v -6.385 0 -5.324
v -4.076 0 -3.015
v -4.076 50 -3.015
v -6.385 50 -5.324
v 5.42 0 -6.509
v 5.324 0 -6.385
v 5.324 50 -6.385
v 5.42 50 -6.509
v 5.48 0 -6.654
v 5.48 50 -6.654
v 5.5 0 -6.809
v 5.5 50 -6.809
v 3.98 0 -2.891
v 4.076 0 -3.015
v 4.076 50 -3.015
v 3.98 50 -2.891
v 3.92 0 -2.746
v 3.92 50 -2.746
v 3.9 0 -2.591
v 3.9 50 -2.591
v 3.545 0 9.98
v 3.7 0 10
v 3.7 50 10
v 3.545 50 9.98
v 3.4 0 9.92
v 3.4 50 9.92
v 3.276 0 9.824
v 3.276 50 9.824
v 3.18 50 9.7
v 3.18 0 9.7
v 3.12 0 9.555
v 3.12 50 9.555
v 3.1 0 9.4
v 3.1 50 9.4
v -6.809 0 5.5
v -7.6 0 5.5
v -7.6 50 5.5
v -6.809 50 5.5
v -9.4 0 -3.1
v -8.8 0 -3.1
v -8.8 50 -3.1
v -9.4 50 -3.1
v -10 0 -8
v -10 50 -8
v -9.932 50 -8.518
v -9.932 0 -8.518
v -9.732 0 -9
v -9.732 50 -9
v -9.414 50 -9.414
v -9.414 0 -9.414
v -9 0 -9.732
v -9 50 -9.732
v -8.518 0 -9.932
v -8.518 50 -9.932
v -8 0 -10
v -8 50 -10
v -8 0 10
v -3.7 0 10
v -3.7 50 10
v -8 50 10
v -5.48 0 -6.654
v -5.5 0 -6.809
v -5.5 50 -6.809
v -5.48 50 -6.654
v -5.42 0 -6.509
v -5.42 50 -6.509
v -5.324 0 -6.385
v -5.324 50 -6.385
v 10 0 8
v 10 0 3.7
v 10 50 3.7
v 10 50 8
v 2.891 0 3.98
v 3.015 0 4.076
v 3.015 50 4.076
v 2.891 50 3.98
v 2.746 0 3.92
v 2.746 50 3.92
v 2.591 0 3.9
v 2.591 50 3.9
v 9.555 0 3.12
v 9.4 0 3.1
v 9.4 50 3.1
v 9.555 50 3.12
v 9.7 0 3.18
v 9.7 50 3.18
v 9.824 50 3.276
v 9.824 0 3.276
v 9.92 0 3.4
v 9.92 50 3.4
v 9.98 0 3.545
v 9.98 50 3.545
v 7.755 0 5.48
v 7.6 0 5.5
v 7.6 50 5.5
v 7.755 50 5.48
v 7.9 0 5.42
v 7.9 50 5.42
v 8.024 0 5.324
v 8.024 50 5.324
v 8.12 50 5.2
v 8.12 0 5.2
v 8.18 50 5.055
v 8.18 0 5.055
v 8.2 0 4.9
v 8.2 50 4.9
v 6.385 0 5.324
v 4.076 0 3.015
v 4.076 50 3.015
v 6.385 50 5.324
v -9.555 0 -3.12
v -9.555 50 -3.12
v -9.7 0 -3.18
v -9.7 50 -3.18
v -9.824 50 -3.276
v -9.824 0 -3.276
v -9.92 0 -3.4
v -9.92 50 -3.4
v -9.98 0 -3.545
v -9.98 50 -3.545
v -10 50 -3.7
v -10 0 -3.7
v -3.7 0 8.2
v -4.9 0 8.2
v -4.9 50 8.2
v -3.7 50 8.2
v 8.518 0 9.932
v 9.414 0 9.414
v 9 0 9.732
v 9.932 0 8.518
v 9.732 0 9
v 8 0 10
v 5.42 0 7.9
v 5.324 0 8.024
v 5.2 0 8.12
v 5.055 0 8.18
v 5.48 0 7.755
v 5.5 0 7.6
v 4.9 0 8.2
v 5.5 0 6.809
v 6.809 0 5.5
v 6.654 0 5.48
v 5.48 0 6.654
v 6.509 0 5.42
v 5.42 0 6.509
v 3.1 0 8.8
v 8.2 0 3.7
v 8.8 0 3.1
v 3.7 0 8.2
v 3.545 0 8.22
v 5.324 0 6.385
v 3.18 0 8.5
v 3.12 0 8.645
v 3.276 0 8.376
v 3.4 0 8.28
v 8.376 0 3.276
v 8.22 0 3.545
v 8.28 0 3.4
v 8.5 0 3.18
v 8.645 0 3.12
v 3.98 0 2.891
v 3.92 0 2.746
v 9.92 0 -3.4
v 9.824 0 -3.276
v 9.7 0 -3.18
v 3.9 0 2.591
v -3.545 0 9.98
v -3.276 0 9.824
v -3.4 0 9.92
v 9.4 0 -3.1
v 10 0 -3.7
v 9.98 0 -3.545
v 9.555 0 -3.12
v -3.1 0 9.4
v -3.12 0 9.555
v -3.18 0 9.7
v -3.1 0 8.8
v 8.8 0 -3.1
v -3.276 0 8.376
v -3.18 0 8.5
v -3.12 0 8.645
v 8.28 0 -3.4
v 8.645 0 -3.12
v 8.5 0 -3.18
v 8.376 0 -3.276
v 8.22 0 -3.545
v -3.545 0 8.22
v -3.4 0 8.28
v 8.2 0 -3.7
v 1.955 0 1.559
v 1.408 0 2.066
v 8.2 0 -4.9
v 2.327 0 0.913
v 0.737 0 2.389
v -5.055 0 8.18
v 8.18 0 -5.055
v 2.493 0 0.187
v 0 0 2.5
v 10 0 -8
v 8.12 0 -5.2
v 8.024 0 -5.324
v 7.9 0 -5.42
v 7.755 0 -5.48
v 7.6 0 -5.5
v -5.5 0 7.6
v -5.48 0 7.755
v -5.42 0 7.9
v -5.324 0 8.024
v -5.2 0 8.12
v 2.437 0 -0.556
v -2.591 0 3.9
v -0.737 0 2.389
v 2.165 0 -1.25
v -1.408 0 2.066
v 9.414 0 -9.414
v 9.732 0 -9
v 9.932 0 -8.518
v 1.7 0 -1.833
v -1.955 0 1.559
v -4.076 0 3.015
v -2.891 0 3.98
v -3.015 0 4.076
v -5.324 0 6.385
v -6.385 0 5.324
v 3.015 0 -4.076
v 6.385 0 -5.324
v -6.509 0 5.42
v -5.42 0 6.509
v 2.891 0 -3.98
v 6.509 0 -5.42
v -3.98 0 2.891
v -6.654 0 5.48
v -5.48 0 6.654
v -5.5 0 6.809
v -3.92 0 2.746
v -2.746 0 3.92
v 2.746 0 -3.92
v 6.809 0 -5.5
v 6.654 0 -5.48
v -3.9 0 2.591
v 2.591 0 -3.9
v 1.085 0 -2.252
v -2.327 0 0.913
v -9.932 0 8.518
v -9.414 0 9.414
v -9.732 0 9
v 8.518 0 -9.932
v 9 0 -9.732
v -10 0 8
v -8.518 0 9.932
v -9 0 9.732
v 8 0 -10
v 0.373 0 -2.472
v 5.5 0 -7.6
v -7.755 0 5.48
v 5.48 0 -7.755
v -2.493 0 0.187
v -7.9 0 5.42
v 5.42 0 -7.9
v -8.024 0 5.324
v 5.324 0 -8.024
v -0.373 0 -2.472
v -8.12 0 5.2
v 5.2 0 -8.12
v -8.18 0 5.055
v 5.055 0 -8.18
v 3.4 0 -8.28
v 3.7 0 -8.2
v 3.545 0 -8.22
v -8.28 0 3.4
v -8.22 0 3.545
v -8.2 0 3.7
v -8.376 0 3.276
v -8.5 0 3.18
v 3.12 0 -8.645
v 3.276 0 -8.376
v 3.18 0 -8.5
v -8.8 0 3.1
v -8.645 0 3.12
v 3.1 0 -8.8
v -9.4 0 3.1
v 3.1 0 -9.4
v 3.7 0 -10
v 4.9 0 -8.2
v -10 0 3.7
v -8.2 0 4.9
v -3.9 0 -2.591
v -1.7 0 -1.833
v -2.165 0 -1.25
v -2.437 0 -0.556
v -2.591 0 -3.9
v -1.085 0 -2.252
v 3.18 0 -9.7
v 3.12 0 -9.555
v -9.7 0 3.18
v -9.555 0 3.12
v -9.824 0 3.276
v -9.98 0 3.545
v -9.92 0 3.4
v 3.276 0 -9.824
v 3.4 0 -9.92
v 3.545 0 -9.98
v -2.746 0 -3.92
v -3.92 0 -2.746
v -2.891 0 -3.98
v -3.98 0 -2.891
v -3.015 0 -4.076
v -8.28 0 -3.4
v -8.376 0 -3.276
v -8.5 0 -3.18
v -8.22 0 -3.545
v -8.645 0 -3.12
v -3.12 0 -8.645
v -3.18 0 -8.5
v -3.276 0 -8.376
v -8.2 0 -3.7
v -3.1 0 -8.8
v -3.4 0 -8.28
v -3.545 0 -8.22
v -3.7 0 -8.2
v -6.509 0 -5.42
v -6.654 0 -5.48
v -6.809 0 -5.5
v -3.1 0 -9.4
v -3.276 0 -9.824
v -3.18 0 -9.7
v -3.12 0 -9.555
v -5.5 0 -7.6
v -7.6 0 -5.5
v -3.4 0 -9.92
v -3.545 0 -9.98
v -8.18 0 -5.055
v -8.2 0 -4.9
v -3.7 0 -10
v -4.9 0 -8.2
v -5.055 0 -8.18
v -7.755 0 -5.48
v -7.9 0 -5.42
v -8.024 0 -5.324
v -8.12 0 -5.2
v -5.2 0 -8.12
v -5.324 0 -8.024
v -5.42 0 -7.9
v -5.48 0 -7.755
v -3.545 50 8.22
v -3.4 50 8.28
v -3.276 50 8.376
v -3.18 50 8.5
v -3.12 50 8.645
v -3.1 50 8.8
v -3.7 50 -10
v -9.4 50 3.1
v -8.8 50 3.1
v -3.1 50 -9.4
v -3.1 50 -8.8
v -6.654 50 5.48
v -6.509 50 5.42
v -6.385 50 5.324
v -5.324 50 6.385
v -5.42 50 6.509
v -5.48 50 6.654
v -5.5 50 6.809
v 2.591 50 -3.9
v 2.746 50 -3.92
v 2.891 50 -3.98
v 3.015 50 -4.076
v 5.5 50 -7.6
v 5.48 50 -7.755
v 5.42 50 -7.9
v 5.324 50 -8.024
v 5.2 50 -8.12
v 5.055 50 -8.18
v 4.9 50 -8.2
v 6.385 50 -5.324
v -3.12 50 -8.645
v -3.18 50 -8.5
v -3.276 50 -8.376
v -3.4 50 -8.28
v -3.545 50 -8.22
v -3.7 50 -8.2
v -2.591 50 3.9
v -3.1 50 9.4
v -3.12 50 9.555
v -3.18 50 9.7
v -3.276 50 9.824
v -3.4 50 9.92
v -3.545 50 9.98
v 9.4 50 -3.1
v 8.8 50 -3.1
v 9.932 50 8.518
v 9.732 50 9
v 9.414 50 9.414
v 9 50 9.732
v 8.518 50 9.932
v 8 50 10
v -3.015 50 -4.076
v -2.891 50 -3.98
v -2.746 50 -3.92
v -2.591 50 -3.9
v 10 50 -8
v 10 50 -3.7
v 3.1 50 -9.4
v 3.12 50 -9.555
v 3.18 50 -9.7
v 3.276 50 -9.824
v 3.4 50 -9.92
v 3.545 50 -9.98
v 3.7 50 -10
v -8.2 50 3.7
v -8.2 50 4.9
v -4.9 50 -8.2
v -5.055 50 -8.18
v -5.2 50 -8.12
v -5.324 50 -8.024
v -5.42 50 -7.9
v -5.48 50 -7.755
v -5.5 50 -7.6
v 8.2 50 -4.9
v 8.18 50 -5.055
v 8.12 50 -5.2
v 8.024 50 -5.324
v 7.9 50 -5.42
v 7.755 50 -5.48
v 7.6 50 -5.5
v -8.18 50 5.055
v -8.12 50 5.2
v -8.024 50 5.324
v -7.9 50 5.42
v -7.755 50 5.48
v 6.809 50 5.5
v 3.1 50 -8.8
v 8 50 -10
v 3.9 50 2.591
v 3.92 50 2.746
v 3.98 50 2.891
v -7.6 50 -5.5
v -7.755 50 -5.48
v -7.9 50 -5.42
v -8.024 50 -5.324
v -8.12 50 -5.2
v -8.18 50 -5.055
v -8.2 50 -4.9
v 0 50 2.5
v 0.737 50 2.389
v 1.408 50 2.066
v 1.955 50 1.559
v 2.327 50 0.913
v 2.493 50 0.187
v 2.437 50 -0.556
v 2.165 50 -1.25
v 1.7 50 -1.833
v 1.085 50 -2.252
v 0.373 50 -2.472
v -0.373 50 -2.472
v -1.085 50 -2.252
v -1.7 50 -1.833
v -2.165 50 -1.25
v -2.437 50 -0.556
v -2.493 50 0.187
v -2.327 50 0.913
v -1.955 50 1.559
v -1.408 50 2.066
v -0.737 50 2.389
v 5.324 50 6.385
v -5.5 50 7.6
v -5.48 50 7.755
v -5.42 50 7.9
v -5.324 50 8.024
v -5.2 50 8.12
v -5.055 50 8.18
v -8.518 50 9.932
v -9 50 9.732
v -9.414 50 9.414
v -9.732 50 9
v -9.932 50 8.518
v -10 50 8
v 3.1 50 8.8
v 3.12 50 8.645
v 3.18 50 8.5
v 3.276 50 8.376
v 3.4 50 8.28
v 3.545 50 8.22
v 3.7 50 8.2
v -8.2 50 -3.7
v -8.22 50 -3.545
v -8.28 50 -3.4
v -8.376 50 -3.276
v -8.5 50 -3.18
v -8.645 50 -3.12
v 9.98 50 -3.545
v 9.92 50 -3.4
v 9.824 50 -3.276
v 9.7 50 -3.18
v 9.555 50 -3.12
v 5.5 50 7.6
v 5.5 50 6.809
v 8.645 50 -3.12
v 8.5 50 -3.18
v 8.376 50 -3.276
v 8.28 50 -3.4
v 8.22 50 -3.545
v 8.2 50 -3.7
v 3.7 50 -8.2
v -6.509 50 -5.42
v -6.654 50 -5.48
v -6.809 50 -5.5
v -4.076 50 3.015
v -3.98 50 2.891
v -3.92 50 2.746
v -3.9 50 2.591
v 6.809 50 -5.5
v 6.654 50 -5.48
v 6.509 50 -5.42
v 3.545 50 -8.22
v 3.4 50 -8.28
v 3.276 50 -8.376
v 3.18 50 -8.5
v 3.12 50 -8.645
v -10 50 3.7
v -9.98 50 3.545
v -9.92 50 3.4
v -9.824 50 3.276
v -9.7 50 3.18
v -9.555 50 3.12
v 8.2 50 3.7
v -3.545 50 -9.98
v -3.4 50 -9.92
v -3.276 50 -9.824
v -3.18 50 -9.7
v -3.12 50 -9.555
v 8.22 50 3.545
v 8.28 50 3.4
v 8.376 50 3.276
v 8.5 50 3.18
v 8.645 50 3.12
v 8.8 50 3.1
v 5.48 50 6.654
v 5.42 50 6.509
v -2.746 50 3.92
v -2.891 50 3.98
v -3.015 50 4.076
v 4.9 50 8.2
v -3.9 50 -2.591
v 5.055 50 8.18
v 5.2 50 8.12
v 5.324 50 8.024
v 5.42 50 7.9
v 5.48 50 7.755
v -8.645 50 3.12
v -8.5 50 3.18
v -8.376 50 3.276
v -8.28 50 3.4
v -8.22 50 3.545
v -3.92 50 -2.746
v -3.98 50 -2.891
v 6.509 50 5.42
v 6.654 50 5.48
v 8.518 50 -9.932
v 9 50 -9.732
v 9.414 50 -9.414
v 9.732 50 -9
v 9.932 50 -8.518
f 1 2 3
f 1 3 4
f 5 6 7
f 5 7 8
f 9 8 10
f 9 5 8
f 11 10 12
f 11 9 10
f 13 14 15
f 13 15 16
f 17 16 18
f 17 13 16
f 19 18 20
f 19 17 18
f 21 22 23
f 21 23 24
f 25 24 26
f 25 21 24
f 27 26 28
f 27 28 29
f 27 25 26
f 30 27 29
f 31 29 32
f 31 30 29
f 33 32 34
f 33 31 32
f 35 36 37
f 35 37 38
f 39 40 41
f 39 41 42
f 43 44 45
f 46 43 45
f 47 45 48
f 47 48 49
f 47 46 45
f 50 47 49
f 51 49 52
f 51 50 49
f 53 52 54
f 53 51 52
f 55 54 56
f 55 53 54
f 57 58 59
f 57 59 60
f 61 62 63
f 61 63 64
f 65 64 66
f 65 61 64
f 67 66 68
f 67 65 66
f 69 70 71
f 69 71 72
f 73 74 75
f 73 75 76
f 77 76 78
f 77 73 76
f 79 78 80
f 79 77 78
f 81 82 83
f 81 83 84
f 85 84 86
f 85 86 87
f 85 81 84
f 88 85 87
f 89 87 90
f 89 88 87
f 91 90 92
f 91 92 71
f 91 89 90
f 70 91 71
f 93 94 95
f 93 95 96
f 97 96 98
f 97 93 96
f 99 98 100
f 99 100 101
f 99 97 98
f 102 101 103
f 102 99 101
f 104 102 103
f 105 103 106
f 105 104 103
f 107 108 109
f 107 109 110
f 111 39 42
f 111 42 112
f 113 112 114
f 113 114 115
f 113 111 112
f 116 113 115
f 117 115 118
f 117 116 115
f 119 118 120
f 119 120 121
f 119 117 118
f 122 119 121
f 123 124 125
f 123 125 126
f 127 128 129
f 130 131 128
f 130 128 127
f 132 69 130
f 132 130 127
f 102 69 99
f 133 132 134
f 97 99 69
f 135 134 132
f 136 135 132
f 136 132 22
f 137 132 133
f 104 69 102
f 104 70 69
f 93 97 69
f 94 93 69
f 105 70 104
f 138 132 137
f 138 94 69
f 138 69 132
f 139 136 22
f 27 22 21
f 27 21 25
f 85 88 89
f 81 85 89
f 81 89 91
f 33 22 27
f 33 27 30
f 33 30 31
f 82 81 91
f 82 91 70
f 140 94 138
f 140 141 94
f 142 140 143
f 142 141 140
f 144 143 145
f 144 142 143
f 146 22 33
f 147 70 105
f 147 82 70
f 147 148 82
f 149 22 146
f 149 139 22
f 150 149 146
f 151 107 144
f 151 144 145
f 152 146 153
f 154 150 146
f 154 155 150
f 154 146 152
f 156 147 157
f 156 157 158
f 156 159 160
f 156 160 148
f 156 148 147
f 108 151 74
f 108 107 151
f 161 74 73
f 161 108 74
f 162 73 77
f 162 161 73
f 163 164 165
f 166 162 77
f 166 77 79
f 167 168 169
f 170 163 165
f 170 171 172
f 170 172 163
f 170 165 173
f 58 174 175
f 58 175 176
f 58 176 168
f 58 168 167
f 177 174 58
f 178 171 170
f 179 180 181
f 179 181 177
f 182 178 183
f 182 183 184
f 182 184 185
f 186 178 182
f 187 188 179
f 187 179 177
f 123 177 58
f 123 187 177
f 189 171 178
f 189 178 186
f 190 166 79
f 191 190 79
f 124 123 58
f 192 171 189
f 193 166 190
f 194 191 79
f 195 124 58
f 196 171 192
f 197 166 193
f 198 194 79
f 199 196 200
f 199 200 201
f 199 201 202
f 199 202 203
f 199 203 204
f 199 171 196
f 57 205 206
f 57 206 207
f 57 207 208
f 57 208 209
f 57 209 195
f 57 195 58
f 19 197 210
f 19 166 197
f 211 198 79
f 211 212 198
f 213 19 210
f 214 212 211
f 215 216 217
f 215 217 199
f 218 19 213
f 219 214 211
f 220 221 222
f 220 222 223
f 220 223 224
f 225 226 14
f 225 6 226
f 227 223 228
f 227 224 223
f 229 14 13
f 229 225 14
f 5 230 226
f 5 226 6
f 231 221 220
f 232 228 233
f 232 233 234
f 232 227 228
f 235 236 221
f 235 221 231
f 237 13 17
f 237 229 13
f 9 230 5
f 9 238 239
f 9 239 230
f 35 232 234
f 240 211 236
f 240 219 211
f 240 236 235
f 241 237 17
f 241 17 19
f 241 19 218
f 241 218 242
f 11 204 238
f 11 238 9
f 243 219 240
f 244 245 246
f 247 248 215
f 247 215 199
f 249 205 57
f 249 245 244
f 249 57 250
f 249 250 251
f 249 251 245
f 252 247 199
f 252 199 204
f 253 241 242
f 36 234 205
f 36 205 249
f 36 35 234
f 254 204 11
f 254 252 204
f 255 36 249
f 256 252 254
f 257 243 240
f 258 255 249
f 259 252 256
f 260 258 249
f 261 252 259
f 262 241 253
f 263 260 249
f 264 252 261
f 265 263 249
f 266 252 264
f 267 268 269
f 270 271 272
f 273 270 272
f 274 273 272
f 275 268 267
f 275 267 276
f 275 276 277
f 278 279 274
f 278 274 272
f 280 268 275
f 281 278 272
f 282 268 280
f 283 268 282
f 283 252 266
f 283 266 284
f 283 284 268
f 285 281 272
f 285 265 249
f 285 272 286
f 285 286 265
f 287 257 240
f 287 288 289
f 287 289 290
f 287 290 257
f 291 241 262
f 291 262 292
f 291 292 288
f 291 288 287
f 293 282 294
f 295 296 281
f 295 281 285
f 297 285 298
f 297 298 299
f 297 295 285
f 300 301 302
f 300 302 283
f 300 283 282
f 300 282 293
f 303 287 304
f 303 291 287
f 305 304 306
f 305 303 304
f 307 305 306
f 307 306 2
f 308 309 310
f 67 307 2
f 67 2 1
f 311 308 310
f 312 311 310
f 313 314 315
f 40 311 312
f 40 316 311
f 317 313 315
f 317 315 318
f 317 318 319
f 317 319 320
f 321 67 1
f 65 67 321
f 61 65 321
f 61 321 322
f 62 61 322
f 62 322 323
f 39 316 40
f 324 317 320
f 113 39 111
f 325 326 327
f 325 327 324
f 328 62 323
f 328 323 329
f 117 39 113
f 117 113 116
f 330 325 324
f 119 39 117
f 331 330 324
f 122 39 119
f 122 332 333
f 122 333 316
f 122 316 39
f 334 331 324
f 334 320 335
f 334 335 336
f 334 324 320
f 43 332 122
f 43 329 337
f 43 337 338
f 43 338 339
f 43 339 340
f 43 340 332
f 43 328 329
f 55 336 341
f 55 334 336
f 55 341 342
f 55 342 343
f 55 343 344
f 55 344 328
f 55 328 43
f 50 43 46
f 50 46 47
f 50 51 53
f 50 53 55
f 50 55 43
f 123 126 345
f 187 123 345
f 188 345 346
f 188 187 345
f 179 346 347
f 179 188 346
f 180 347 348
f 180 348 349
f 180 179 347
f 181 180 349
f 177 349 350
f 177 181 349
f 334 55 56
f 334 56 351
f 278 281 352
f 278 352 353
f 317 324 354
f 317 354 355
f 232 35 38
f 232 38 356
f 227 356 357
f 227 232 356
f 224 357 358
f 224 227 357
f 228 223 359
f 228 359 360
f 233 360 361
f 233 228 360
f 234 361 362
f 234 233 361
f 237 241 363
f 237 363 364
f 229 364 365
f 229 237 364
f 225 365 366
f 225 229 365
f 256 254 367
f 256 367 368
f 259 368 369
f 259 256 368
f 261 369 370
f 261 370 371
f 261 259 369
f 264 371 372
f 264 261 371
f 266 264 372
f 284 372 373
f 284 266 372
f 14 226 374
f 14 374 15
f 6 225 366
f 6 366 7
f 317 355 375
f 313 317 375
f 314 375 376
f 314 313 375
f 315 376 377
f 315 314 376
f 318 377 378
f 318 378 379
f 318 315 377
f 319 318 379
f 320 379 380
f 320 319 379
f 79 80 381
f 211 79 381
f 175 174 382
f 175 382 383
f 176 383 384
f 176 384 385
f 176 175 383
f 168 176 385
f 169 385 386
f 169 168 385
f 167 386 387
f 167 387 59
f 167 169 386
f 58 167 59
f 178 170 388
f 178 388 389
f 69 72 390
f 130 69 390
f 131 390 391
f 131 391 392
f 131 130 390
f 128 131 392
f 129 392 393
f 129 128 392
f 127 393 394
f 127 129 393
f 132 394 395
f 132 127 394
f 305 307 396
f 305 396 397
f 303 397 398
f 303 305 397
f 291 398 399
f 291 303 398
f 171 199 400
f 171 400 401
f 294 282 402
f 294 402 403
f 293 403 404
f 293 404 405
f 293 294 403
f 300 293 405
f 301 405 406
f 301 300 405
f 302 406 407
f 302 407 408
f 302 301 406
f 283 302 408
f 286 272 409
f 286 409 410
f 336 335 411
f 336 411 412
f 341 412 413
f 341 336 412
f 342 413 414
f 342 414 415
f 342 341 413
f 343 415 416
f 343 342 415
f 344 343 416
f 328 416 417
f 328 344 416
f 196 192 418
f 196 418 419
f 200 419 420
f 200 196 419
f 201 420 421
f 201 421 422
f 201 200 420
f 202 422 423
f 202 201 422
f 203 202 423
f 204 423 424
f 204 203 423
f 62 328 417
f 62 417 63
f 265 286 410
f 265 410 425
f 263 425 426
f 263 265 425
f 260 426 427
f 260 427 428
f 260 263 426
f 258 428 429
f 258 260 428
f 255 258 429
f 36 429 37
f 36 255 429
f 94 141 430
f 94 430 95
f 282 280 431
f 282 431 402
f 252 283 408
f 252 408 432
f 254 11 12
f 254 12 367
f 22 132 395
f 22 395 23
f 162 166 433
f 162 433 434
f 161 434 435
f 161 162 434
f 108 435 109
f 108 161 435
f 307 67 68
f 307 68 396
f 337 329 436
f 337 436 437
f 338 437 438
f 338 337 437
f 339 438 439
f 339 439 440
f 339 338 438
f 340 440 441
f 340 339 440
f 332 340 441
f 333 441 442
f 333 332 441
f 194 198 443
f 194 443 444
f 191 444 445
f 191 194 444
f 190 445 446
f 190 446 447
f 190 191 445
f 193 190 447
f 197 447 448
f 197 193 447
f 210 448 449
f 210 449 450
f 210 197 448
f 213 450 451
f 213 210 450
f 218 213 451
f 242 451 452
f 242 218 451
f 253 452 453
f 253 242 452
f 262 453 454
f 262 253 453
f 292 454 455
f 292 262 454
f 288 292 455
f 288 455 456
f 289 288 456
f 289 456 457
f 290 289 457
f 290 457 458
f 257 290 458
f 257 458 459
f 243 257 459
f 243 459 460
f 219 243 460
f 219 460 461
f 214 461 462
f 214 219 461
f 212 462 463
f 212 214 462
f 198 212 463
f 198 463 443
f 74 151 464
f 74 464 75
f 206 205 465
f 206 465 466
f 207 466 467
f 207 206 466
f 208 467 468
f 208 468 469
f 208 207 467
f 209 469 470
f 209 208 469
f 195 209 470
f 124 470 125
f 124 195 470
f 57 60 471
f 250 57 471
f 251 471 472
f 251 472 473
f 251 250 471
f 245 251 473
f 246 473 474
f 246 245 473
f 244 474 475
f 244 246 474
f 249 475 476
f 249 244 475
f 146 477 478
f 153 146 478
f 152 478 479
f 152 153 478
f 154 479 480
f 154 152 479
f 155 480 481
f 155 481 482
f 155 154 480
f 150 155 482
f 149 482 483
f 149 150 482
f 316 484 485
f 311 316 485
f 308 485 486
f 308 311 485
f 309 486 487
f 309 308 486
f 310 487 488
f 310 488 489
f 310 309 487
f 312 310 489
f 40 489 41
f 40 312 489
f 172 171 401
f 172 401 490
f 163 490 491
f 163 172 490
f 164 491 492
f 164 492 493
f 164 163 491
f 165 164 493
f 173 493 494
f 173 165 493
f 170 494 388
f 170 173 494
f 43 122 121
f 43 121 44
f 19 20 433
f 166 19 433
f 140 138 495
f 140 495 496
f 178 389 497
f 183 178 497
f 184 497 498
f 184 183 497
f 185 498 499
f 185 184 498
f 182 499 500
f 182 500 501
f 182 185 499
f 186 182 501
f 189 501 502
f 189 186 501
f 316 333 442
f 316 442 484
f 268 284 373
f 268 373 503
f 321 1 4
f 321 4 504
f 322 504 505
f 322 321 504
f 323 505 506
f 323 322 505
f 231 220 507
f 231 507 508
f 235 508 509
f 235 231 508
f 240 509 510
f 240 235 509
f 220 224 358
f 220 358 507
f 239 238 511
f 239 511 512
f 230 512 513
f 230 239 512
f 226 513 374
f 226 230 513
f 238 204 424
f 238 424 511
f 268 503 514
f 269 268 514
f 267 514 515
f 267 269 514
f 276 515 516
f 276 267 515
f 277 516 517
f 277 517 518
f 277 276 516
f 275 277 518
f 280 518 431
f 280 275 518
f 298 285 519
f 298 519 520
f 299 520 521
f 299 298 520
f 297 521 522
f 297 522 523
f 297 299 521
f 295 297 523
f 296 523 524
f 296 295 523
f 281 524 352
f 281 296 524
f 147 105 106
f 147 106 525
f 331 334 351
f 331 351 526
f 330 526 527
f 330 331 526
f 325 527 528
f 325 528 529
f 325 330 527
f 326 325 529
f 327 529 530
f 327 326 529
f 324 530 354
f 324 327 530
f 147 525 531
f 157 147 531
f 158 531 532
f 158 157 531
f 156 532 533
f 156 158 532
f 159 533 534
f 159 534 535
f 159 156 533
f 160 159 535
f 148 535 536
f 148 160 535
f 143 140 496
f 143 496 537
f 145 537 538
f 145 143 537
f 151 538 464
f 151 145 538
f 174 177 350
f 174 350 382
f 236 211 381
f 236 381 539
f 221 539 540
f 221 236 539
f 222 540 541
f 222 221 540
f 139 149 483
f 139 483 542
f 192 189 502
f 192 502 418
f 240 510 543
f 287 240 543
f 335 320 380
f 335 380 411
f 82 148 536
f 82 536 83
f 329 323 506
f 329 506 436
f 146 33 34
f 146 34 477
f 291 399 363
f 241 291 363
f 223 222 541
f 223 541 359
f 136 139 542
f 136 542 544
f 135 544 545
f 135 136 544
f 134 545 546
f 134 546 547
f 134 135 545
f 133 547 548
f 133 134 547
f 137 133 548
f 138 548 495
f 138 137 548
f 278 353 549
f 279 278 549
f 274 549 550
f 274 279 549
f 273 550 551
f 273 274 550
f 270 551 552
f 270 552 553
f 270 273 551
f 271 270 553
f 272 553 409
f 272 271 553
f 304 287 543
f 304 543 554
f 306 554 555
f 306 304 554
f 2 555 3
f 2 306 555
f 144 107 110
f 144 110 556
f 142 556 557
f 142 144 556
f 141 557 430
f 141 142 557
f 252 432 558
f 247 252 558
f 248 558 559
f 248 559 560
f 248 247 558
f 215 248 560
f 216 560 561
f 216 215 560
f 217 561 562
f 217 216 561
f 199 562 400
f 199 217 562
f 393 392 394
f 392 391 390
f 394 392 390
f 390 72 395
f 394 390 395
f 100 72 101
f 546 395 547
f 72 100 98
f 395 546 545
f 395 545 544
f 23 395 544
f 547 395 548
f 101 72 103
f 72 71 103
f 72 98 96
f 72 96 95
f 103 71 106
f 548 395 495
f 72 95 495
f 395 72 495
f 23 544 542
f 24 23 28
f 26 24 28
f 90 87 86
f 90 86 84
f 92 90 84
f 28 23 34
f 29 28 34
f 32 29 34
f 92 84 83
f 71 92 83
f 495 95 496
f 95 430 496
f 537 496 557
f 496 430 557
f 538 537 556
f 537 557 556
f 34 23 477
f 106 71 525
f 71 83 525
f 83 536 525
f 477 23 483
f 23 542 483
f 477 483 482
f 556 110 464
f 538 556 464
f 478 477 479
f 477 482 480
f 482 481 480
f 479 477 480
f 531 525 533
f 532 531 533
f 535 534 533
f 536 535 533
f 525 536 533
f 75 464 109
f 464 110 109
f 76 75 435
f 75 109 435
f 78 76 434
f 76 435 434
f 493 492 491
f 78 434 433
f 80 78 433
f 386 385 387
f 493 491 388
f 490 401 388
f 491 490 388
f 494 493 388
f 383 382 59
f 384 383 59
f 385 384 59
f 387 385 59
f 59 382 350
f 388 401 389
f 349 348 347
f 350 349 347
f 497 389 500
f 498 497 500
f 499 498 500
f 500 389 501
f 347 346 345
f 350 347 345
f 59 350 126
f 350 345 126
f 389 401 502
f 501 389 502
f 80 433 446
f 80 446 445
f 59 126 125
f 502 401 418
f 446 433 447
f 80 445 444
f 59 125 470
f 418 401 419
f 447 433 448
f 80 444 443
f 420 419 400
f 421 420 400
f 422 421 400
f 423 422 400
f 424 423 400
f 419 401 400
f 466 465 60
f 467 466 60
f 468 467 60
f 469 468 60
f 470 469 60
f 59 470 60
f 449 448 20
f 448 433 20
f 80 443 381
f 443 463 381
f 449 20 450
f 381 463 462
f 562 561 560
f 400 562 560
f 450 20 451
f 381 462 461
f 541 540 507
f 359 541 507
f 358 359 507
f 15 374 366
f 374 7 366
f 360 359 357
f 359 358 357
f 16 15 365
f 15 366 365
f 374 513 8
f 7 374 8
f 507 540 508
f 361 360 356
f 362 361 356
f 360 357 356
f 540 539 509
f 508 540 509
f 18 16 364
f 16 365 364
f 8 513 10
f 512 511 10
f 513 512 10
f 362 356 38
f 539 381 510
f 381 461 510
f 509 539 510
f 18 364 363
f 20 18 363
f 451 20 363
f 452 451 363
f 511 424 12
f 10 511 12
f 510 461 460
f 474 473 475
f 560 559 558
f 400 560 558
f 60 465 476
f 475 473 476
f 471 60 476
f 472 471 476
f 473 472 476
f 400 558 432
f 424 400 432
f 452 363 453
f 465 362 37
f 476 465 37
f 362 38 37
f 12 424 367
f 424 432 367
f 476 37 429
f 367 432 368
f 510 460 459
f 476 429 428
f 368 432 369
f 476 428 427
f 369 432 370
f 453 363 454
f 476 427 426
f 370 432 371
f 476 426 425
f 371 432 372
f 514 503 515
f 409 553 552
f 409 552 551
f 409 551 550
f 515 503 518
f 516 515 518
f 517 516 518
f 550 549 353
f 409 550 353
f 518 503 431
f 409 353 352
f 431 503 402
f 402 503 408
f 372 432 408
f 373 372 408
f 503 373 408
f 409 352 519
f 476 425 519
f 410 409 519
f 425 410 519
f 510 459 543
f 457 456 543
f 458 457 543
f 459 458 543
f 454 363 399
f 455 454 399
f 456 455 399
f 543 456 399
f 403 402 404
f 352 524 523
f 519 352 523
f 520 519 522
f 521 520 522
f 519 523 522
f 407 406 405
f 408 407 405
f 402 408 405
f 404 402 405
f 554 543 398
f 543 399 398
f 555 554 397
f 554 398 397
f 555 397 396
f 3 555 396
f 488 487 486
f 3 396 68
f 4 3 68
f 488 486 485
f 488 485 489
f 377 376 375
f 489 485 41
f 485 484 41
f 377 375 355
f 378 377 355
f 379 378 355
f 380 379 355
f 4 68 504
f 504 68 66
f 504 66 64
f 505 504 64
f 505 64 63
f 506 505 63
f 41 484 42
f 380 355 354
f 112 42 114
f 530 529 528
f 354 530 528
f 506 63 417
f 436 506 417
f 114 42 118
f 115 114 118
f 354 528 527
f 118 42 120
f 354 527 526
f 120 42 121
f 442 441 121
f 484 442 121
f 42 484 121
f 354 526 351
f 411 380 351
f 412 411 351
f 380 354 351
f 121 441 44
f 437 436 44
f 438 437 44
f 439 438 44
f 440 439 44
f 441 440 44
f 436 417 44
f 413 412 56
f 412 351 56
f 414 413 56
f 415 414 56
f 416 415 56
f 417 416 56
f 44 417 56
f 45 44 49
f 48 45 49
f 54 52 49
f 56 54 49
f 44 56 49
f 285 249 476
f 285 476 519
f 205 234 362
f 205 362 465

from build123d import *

# Parameters (mm, degrees)
SKETCH_1_R      = 2.5
EXTRUDE_1_DEPTH = 50


with BuildPart() as part:
    # 草图1 → 凸台-拉伸1 (new body)
    with BuildSketch(Plane(origin=(0, 0, 0), x_dir=(1, 0, 0), z_dir=(0, 1, 0))):
        with BuildLine():
            Line((3.1, 8.8), (3.1, 9.4))
            ThreePointArc((3.1, 9.4), (3.275735931, 9.824264069), (3.7, 10))
            Line((3.7, 10), (8, 10))
            ThreePointArc((8, 10), (9.414213562, 9.414213562), (10, 8))
            Line((10, 8), (10, 3.7))
            ThreePointArc((10, 3.7), (9.824264069, 3.275735931), (9.4, 3.1))
            Line((9.4, 3.1), (8.8, 3.1))
            ThreePointArc((8.8, 3.1), (8.375735931, 3.275735931), (8.2, 3.7))
            Line((8.2, 3.7), (8.2, 4.9))
            ThreePointArc((8.2, 4.9), (8.024264069, 5.324264069), (7.6, 5.5))
            Line((7.6, 5.5), (6.809188309, 5.5))
            ThreePointArc((6.809188309, 5.5), (6.57957825, 5.45432772), (6.38492424, 5.324264069))
            Line((6.38492424, 5.324264069), (4.075735931, 3.01507576))
            ThreePointArc((4.075735931, 3.01507576), (3.94567228, 2.82042175), (3.9, 2.590811691))
            Line((3.9, 2.590811691), (3.9, 0))
            Line((3.9, 0), (3.9, -2.590811691))
            ThreePointArc((3.9, -2.590811691), (3.94567228, -2.82042175), (4.075735931, -3.01507576))
            Line((4.075735931, -3.01507576), (6.38492424, -5.324264069))
            ThreePointArc((6.38492424, -5.324264069), (6.57957825, -5.45432772), (6.809188309, -5.5))
            Line((6.809188309, -5.5), (7.6, -5.5))
            ThreePointArc((7.6, -5.5), (8.024264069, -5.324264069), (8.2, -4.9))
            Line((8.2, -4.9), (8.2, -3.7))
            ThreePointArc((8.2, -3.7), (8.375735931, -3.275735931), (8.8, -3.1))
            Line((8.8, -3.1), (9.4, -3.1))
            ThreePointArc((9.4, -3.1), (9.824264069, -3.275735931), (10, -3.7))
            Line((10, -3.7), (10, -8))
            ThreePointArc((10, -8), (9.414213562, -9.414213562), (8, -10))
            Line((8, -10), (3.7, -10))
            ThreePointArc((3.7, -10), (3.275735931, -9.824264069), (3.1, -9.4))
            Line((3.1, -9.4), (3.1, -8.8))
            ThreePointArc((3.1, -8.8), (3.275735931, -8.375735931), (3.7, -8.2))
            Line((3.7, -8.2), (4.9, -8.2))
            ThreePointArc((4.9, -8.2), (5.324264069, -8.024264069), (5.5, -7.6))
            Line((5.5, -7.6), (5.5, -6.809188309))
            ThreePointArc((5.5, -6.809188309), (5.45432772, -6.57957825), (5.324264069, -6.38492424))
            Line((5.324264069, -6.38492424), (3.01507576, -4.075735931))
            ThreePointArc((3.01507576, -4.075735931), (2.82042175, -3.94567228), (2.590811691, -3.9))
            Line((2.590811691, -3.9), (0, -3.9))
            Line((0, -3.9), (-2.590811691, -3.9))
            ThreePointArc((-2.590811691, -3.9), (-2.82042175, -3.94567228), (-3.01507576, -4.075735931))
            Line((-3.01507576, -4.075735931), (-5.324264069, -6.38492424))
            ThreePointArc((-5.324264069, -6.38492424), (-5.45432772, -6.57957825), (-5.5, -6.809188309))
            Line((-5.5, -6.809188309), (-5.5, -7.6))
            ThreePointArc((-5.5, -7.6), (-5.324264069, -8.024264069), (-4.9, -8.2))
            Line((-4.9, -8.2), (-3.7, -8.2))
            ThreePointArc((-3.7, -8.2), (-3.275735931, -8.375735931), (-3.1, -8.8))
            Line((-3.1, -8.8), (-3.1, -9.4))
            ThreePointArc((-3.1, -9.4), (-3.275735931, -9.824264069), (-3.7, -10))
            Line((-3.7, -10), (-8, -10))
            ThreePointArc((-8, -10), (-9.414213562, -9.414213562), (-10, -8))
            Line((-10, -8), (-10, -3.7))
            ThreePointArc((-10, -3.7), (-9.824264069, -3.275735931), (-9.4, -3.1))
            Line((-9.4, -3.1), (-8.8, -3.1))
            ThreePointArc((-8.8, -3.1), (-8.375735931, -3.275735931), (-8.2, -3.7))
            Line((-8.2, -3.7), (-8.2, -4.9))
            ThreePointArc((-8.2, -4.9), (-8.024264069, -5.324264069), (-7.6, -5.5))
            Line((-7.6, -5.5), (-6.809188309, -5.5))
            ThreePointArc((-6.809188309, -5.5), (-6.57957825, -5.45432772), (-6.38492424, -5.324264069))
            Line((-6.38492424, -5.324264069), (-4.075735931, -3.01507576))
            ThreePointArc((-4.075735931, -3.01507576), (-3.94567228, -2.82042175), (-3.9, -2.590811691))
            Line((-3.9, -2.590811691), (-3.9, 0))
            Line((-3.9, 0), (-3.9, 2.590811691))
            ThreePointArc((-3.9, 2.590811691), (-3.94567228, 2.82042175), (-4.075735931, 3.01507576))
            Line((-4.075735931, 3.01507576), (-6.38492424, 5.324264069))
            ThreePointArc((-6.38492424, 5.324264069), (-6.57957825, 5.45432772), (-6.809188309, 5.5))
            Line((-6.809188309, 5.5), (-7.6, 5.5))
            ThreePointArc((-7.6, 5.5), (-8.024264069, 5.324264069), (-8.2, 4.9))
            Line((-8.2, 4.9), (-8.2, 3.7))
            ThreePointArc((-8.2, 3.7), (-8.375735931, 3.275735931), (-8.8, 3.1))
            Line((-8.8, 3.1), (-9.4, 3.1))
            ThreePointArc((-9.4, 3.1), (-9.824264069, 3.275735931), (-10, 3.7))
            Line((-10, 3.7), (-10, 8))
            ThreePointArc((-10, 8), (-9.414213562, 9.414213562), (-8, 10))
            Line((-8, 10), (-3.7, 10))
            ThreePointArc((-3.7, 10), (-3.275735931, 9.824264069), (-3.1, 9.4))
            Line((-3.1, 9.4), (-3.1, 8.8))
            ThreePointArc((-3.1, 8.8), (-3.275735931, 8.375735931), (-3.7, 8.2))
            Line((-3.7, 8.2), (-4.9, 8.2))
            ThreePointArc((-4.9, 8.2), (-5.324264069, 8.024264069), (-5.5, 7.6))
            Line((-5.5, 7.6), (-5.5, 6.809188309))
            ThreePointArc((-5.5, 6.809188309), (-5.45432772, 6.57957825), (-5.324264069, 6.38492424))
            Line((-5.324264069, 6.38492424), (-3.01507576, 4.075735931))
            ThreePointArc((-3.01507576, 4.075735931), (-2.82042175, 3.94567228), (-2.590811691, 3.9))
            Line((-2.590811691, 3.9), (0, 3.9))
            Line((0, 3.9), (2.590811691, 3.9))
            ThreePointArc((2.590811691, 3.9), (2.82042175, 3.94567228), (3.01507576, 4.075735931))
            Line((3.01507576, 4.075735931), (5.324264069, 6.38492424))
            ThreePointArc((5.324264069, 6.38492424), (5.45432772, 6.57957825), (5.5, 6.809188309))
            Line((5.5, 6.809188309), (5.5, 7.6))
            ThreePointArc((5.5, 7.6), (5.324264069, 8.024264069), (4.9, 8.2))
            Line((4.9, 8.2), (3.7, 8.2))
            ThreePointArc((3.7, 8.2), (3.275735931, 8.375735931), (3.1, 8.8))
        make_face()
        with Locations(Location((0, 0, 0), (0, 0, 270))):
            Circle(SKETCH_1_R, mode=Mode.SUBTRACT)
    extrude(amount=EXTRUDE_1_DEPTH)


solid = part.part
